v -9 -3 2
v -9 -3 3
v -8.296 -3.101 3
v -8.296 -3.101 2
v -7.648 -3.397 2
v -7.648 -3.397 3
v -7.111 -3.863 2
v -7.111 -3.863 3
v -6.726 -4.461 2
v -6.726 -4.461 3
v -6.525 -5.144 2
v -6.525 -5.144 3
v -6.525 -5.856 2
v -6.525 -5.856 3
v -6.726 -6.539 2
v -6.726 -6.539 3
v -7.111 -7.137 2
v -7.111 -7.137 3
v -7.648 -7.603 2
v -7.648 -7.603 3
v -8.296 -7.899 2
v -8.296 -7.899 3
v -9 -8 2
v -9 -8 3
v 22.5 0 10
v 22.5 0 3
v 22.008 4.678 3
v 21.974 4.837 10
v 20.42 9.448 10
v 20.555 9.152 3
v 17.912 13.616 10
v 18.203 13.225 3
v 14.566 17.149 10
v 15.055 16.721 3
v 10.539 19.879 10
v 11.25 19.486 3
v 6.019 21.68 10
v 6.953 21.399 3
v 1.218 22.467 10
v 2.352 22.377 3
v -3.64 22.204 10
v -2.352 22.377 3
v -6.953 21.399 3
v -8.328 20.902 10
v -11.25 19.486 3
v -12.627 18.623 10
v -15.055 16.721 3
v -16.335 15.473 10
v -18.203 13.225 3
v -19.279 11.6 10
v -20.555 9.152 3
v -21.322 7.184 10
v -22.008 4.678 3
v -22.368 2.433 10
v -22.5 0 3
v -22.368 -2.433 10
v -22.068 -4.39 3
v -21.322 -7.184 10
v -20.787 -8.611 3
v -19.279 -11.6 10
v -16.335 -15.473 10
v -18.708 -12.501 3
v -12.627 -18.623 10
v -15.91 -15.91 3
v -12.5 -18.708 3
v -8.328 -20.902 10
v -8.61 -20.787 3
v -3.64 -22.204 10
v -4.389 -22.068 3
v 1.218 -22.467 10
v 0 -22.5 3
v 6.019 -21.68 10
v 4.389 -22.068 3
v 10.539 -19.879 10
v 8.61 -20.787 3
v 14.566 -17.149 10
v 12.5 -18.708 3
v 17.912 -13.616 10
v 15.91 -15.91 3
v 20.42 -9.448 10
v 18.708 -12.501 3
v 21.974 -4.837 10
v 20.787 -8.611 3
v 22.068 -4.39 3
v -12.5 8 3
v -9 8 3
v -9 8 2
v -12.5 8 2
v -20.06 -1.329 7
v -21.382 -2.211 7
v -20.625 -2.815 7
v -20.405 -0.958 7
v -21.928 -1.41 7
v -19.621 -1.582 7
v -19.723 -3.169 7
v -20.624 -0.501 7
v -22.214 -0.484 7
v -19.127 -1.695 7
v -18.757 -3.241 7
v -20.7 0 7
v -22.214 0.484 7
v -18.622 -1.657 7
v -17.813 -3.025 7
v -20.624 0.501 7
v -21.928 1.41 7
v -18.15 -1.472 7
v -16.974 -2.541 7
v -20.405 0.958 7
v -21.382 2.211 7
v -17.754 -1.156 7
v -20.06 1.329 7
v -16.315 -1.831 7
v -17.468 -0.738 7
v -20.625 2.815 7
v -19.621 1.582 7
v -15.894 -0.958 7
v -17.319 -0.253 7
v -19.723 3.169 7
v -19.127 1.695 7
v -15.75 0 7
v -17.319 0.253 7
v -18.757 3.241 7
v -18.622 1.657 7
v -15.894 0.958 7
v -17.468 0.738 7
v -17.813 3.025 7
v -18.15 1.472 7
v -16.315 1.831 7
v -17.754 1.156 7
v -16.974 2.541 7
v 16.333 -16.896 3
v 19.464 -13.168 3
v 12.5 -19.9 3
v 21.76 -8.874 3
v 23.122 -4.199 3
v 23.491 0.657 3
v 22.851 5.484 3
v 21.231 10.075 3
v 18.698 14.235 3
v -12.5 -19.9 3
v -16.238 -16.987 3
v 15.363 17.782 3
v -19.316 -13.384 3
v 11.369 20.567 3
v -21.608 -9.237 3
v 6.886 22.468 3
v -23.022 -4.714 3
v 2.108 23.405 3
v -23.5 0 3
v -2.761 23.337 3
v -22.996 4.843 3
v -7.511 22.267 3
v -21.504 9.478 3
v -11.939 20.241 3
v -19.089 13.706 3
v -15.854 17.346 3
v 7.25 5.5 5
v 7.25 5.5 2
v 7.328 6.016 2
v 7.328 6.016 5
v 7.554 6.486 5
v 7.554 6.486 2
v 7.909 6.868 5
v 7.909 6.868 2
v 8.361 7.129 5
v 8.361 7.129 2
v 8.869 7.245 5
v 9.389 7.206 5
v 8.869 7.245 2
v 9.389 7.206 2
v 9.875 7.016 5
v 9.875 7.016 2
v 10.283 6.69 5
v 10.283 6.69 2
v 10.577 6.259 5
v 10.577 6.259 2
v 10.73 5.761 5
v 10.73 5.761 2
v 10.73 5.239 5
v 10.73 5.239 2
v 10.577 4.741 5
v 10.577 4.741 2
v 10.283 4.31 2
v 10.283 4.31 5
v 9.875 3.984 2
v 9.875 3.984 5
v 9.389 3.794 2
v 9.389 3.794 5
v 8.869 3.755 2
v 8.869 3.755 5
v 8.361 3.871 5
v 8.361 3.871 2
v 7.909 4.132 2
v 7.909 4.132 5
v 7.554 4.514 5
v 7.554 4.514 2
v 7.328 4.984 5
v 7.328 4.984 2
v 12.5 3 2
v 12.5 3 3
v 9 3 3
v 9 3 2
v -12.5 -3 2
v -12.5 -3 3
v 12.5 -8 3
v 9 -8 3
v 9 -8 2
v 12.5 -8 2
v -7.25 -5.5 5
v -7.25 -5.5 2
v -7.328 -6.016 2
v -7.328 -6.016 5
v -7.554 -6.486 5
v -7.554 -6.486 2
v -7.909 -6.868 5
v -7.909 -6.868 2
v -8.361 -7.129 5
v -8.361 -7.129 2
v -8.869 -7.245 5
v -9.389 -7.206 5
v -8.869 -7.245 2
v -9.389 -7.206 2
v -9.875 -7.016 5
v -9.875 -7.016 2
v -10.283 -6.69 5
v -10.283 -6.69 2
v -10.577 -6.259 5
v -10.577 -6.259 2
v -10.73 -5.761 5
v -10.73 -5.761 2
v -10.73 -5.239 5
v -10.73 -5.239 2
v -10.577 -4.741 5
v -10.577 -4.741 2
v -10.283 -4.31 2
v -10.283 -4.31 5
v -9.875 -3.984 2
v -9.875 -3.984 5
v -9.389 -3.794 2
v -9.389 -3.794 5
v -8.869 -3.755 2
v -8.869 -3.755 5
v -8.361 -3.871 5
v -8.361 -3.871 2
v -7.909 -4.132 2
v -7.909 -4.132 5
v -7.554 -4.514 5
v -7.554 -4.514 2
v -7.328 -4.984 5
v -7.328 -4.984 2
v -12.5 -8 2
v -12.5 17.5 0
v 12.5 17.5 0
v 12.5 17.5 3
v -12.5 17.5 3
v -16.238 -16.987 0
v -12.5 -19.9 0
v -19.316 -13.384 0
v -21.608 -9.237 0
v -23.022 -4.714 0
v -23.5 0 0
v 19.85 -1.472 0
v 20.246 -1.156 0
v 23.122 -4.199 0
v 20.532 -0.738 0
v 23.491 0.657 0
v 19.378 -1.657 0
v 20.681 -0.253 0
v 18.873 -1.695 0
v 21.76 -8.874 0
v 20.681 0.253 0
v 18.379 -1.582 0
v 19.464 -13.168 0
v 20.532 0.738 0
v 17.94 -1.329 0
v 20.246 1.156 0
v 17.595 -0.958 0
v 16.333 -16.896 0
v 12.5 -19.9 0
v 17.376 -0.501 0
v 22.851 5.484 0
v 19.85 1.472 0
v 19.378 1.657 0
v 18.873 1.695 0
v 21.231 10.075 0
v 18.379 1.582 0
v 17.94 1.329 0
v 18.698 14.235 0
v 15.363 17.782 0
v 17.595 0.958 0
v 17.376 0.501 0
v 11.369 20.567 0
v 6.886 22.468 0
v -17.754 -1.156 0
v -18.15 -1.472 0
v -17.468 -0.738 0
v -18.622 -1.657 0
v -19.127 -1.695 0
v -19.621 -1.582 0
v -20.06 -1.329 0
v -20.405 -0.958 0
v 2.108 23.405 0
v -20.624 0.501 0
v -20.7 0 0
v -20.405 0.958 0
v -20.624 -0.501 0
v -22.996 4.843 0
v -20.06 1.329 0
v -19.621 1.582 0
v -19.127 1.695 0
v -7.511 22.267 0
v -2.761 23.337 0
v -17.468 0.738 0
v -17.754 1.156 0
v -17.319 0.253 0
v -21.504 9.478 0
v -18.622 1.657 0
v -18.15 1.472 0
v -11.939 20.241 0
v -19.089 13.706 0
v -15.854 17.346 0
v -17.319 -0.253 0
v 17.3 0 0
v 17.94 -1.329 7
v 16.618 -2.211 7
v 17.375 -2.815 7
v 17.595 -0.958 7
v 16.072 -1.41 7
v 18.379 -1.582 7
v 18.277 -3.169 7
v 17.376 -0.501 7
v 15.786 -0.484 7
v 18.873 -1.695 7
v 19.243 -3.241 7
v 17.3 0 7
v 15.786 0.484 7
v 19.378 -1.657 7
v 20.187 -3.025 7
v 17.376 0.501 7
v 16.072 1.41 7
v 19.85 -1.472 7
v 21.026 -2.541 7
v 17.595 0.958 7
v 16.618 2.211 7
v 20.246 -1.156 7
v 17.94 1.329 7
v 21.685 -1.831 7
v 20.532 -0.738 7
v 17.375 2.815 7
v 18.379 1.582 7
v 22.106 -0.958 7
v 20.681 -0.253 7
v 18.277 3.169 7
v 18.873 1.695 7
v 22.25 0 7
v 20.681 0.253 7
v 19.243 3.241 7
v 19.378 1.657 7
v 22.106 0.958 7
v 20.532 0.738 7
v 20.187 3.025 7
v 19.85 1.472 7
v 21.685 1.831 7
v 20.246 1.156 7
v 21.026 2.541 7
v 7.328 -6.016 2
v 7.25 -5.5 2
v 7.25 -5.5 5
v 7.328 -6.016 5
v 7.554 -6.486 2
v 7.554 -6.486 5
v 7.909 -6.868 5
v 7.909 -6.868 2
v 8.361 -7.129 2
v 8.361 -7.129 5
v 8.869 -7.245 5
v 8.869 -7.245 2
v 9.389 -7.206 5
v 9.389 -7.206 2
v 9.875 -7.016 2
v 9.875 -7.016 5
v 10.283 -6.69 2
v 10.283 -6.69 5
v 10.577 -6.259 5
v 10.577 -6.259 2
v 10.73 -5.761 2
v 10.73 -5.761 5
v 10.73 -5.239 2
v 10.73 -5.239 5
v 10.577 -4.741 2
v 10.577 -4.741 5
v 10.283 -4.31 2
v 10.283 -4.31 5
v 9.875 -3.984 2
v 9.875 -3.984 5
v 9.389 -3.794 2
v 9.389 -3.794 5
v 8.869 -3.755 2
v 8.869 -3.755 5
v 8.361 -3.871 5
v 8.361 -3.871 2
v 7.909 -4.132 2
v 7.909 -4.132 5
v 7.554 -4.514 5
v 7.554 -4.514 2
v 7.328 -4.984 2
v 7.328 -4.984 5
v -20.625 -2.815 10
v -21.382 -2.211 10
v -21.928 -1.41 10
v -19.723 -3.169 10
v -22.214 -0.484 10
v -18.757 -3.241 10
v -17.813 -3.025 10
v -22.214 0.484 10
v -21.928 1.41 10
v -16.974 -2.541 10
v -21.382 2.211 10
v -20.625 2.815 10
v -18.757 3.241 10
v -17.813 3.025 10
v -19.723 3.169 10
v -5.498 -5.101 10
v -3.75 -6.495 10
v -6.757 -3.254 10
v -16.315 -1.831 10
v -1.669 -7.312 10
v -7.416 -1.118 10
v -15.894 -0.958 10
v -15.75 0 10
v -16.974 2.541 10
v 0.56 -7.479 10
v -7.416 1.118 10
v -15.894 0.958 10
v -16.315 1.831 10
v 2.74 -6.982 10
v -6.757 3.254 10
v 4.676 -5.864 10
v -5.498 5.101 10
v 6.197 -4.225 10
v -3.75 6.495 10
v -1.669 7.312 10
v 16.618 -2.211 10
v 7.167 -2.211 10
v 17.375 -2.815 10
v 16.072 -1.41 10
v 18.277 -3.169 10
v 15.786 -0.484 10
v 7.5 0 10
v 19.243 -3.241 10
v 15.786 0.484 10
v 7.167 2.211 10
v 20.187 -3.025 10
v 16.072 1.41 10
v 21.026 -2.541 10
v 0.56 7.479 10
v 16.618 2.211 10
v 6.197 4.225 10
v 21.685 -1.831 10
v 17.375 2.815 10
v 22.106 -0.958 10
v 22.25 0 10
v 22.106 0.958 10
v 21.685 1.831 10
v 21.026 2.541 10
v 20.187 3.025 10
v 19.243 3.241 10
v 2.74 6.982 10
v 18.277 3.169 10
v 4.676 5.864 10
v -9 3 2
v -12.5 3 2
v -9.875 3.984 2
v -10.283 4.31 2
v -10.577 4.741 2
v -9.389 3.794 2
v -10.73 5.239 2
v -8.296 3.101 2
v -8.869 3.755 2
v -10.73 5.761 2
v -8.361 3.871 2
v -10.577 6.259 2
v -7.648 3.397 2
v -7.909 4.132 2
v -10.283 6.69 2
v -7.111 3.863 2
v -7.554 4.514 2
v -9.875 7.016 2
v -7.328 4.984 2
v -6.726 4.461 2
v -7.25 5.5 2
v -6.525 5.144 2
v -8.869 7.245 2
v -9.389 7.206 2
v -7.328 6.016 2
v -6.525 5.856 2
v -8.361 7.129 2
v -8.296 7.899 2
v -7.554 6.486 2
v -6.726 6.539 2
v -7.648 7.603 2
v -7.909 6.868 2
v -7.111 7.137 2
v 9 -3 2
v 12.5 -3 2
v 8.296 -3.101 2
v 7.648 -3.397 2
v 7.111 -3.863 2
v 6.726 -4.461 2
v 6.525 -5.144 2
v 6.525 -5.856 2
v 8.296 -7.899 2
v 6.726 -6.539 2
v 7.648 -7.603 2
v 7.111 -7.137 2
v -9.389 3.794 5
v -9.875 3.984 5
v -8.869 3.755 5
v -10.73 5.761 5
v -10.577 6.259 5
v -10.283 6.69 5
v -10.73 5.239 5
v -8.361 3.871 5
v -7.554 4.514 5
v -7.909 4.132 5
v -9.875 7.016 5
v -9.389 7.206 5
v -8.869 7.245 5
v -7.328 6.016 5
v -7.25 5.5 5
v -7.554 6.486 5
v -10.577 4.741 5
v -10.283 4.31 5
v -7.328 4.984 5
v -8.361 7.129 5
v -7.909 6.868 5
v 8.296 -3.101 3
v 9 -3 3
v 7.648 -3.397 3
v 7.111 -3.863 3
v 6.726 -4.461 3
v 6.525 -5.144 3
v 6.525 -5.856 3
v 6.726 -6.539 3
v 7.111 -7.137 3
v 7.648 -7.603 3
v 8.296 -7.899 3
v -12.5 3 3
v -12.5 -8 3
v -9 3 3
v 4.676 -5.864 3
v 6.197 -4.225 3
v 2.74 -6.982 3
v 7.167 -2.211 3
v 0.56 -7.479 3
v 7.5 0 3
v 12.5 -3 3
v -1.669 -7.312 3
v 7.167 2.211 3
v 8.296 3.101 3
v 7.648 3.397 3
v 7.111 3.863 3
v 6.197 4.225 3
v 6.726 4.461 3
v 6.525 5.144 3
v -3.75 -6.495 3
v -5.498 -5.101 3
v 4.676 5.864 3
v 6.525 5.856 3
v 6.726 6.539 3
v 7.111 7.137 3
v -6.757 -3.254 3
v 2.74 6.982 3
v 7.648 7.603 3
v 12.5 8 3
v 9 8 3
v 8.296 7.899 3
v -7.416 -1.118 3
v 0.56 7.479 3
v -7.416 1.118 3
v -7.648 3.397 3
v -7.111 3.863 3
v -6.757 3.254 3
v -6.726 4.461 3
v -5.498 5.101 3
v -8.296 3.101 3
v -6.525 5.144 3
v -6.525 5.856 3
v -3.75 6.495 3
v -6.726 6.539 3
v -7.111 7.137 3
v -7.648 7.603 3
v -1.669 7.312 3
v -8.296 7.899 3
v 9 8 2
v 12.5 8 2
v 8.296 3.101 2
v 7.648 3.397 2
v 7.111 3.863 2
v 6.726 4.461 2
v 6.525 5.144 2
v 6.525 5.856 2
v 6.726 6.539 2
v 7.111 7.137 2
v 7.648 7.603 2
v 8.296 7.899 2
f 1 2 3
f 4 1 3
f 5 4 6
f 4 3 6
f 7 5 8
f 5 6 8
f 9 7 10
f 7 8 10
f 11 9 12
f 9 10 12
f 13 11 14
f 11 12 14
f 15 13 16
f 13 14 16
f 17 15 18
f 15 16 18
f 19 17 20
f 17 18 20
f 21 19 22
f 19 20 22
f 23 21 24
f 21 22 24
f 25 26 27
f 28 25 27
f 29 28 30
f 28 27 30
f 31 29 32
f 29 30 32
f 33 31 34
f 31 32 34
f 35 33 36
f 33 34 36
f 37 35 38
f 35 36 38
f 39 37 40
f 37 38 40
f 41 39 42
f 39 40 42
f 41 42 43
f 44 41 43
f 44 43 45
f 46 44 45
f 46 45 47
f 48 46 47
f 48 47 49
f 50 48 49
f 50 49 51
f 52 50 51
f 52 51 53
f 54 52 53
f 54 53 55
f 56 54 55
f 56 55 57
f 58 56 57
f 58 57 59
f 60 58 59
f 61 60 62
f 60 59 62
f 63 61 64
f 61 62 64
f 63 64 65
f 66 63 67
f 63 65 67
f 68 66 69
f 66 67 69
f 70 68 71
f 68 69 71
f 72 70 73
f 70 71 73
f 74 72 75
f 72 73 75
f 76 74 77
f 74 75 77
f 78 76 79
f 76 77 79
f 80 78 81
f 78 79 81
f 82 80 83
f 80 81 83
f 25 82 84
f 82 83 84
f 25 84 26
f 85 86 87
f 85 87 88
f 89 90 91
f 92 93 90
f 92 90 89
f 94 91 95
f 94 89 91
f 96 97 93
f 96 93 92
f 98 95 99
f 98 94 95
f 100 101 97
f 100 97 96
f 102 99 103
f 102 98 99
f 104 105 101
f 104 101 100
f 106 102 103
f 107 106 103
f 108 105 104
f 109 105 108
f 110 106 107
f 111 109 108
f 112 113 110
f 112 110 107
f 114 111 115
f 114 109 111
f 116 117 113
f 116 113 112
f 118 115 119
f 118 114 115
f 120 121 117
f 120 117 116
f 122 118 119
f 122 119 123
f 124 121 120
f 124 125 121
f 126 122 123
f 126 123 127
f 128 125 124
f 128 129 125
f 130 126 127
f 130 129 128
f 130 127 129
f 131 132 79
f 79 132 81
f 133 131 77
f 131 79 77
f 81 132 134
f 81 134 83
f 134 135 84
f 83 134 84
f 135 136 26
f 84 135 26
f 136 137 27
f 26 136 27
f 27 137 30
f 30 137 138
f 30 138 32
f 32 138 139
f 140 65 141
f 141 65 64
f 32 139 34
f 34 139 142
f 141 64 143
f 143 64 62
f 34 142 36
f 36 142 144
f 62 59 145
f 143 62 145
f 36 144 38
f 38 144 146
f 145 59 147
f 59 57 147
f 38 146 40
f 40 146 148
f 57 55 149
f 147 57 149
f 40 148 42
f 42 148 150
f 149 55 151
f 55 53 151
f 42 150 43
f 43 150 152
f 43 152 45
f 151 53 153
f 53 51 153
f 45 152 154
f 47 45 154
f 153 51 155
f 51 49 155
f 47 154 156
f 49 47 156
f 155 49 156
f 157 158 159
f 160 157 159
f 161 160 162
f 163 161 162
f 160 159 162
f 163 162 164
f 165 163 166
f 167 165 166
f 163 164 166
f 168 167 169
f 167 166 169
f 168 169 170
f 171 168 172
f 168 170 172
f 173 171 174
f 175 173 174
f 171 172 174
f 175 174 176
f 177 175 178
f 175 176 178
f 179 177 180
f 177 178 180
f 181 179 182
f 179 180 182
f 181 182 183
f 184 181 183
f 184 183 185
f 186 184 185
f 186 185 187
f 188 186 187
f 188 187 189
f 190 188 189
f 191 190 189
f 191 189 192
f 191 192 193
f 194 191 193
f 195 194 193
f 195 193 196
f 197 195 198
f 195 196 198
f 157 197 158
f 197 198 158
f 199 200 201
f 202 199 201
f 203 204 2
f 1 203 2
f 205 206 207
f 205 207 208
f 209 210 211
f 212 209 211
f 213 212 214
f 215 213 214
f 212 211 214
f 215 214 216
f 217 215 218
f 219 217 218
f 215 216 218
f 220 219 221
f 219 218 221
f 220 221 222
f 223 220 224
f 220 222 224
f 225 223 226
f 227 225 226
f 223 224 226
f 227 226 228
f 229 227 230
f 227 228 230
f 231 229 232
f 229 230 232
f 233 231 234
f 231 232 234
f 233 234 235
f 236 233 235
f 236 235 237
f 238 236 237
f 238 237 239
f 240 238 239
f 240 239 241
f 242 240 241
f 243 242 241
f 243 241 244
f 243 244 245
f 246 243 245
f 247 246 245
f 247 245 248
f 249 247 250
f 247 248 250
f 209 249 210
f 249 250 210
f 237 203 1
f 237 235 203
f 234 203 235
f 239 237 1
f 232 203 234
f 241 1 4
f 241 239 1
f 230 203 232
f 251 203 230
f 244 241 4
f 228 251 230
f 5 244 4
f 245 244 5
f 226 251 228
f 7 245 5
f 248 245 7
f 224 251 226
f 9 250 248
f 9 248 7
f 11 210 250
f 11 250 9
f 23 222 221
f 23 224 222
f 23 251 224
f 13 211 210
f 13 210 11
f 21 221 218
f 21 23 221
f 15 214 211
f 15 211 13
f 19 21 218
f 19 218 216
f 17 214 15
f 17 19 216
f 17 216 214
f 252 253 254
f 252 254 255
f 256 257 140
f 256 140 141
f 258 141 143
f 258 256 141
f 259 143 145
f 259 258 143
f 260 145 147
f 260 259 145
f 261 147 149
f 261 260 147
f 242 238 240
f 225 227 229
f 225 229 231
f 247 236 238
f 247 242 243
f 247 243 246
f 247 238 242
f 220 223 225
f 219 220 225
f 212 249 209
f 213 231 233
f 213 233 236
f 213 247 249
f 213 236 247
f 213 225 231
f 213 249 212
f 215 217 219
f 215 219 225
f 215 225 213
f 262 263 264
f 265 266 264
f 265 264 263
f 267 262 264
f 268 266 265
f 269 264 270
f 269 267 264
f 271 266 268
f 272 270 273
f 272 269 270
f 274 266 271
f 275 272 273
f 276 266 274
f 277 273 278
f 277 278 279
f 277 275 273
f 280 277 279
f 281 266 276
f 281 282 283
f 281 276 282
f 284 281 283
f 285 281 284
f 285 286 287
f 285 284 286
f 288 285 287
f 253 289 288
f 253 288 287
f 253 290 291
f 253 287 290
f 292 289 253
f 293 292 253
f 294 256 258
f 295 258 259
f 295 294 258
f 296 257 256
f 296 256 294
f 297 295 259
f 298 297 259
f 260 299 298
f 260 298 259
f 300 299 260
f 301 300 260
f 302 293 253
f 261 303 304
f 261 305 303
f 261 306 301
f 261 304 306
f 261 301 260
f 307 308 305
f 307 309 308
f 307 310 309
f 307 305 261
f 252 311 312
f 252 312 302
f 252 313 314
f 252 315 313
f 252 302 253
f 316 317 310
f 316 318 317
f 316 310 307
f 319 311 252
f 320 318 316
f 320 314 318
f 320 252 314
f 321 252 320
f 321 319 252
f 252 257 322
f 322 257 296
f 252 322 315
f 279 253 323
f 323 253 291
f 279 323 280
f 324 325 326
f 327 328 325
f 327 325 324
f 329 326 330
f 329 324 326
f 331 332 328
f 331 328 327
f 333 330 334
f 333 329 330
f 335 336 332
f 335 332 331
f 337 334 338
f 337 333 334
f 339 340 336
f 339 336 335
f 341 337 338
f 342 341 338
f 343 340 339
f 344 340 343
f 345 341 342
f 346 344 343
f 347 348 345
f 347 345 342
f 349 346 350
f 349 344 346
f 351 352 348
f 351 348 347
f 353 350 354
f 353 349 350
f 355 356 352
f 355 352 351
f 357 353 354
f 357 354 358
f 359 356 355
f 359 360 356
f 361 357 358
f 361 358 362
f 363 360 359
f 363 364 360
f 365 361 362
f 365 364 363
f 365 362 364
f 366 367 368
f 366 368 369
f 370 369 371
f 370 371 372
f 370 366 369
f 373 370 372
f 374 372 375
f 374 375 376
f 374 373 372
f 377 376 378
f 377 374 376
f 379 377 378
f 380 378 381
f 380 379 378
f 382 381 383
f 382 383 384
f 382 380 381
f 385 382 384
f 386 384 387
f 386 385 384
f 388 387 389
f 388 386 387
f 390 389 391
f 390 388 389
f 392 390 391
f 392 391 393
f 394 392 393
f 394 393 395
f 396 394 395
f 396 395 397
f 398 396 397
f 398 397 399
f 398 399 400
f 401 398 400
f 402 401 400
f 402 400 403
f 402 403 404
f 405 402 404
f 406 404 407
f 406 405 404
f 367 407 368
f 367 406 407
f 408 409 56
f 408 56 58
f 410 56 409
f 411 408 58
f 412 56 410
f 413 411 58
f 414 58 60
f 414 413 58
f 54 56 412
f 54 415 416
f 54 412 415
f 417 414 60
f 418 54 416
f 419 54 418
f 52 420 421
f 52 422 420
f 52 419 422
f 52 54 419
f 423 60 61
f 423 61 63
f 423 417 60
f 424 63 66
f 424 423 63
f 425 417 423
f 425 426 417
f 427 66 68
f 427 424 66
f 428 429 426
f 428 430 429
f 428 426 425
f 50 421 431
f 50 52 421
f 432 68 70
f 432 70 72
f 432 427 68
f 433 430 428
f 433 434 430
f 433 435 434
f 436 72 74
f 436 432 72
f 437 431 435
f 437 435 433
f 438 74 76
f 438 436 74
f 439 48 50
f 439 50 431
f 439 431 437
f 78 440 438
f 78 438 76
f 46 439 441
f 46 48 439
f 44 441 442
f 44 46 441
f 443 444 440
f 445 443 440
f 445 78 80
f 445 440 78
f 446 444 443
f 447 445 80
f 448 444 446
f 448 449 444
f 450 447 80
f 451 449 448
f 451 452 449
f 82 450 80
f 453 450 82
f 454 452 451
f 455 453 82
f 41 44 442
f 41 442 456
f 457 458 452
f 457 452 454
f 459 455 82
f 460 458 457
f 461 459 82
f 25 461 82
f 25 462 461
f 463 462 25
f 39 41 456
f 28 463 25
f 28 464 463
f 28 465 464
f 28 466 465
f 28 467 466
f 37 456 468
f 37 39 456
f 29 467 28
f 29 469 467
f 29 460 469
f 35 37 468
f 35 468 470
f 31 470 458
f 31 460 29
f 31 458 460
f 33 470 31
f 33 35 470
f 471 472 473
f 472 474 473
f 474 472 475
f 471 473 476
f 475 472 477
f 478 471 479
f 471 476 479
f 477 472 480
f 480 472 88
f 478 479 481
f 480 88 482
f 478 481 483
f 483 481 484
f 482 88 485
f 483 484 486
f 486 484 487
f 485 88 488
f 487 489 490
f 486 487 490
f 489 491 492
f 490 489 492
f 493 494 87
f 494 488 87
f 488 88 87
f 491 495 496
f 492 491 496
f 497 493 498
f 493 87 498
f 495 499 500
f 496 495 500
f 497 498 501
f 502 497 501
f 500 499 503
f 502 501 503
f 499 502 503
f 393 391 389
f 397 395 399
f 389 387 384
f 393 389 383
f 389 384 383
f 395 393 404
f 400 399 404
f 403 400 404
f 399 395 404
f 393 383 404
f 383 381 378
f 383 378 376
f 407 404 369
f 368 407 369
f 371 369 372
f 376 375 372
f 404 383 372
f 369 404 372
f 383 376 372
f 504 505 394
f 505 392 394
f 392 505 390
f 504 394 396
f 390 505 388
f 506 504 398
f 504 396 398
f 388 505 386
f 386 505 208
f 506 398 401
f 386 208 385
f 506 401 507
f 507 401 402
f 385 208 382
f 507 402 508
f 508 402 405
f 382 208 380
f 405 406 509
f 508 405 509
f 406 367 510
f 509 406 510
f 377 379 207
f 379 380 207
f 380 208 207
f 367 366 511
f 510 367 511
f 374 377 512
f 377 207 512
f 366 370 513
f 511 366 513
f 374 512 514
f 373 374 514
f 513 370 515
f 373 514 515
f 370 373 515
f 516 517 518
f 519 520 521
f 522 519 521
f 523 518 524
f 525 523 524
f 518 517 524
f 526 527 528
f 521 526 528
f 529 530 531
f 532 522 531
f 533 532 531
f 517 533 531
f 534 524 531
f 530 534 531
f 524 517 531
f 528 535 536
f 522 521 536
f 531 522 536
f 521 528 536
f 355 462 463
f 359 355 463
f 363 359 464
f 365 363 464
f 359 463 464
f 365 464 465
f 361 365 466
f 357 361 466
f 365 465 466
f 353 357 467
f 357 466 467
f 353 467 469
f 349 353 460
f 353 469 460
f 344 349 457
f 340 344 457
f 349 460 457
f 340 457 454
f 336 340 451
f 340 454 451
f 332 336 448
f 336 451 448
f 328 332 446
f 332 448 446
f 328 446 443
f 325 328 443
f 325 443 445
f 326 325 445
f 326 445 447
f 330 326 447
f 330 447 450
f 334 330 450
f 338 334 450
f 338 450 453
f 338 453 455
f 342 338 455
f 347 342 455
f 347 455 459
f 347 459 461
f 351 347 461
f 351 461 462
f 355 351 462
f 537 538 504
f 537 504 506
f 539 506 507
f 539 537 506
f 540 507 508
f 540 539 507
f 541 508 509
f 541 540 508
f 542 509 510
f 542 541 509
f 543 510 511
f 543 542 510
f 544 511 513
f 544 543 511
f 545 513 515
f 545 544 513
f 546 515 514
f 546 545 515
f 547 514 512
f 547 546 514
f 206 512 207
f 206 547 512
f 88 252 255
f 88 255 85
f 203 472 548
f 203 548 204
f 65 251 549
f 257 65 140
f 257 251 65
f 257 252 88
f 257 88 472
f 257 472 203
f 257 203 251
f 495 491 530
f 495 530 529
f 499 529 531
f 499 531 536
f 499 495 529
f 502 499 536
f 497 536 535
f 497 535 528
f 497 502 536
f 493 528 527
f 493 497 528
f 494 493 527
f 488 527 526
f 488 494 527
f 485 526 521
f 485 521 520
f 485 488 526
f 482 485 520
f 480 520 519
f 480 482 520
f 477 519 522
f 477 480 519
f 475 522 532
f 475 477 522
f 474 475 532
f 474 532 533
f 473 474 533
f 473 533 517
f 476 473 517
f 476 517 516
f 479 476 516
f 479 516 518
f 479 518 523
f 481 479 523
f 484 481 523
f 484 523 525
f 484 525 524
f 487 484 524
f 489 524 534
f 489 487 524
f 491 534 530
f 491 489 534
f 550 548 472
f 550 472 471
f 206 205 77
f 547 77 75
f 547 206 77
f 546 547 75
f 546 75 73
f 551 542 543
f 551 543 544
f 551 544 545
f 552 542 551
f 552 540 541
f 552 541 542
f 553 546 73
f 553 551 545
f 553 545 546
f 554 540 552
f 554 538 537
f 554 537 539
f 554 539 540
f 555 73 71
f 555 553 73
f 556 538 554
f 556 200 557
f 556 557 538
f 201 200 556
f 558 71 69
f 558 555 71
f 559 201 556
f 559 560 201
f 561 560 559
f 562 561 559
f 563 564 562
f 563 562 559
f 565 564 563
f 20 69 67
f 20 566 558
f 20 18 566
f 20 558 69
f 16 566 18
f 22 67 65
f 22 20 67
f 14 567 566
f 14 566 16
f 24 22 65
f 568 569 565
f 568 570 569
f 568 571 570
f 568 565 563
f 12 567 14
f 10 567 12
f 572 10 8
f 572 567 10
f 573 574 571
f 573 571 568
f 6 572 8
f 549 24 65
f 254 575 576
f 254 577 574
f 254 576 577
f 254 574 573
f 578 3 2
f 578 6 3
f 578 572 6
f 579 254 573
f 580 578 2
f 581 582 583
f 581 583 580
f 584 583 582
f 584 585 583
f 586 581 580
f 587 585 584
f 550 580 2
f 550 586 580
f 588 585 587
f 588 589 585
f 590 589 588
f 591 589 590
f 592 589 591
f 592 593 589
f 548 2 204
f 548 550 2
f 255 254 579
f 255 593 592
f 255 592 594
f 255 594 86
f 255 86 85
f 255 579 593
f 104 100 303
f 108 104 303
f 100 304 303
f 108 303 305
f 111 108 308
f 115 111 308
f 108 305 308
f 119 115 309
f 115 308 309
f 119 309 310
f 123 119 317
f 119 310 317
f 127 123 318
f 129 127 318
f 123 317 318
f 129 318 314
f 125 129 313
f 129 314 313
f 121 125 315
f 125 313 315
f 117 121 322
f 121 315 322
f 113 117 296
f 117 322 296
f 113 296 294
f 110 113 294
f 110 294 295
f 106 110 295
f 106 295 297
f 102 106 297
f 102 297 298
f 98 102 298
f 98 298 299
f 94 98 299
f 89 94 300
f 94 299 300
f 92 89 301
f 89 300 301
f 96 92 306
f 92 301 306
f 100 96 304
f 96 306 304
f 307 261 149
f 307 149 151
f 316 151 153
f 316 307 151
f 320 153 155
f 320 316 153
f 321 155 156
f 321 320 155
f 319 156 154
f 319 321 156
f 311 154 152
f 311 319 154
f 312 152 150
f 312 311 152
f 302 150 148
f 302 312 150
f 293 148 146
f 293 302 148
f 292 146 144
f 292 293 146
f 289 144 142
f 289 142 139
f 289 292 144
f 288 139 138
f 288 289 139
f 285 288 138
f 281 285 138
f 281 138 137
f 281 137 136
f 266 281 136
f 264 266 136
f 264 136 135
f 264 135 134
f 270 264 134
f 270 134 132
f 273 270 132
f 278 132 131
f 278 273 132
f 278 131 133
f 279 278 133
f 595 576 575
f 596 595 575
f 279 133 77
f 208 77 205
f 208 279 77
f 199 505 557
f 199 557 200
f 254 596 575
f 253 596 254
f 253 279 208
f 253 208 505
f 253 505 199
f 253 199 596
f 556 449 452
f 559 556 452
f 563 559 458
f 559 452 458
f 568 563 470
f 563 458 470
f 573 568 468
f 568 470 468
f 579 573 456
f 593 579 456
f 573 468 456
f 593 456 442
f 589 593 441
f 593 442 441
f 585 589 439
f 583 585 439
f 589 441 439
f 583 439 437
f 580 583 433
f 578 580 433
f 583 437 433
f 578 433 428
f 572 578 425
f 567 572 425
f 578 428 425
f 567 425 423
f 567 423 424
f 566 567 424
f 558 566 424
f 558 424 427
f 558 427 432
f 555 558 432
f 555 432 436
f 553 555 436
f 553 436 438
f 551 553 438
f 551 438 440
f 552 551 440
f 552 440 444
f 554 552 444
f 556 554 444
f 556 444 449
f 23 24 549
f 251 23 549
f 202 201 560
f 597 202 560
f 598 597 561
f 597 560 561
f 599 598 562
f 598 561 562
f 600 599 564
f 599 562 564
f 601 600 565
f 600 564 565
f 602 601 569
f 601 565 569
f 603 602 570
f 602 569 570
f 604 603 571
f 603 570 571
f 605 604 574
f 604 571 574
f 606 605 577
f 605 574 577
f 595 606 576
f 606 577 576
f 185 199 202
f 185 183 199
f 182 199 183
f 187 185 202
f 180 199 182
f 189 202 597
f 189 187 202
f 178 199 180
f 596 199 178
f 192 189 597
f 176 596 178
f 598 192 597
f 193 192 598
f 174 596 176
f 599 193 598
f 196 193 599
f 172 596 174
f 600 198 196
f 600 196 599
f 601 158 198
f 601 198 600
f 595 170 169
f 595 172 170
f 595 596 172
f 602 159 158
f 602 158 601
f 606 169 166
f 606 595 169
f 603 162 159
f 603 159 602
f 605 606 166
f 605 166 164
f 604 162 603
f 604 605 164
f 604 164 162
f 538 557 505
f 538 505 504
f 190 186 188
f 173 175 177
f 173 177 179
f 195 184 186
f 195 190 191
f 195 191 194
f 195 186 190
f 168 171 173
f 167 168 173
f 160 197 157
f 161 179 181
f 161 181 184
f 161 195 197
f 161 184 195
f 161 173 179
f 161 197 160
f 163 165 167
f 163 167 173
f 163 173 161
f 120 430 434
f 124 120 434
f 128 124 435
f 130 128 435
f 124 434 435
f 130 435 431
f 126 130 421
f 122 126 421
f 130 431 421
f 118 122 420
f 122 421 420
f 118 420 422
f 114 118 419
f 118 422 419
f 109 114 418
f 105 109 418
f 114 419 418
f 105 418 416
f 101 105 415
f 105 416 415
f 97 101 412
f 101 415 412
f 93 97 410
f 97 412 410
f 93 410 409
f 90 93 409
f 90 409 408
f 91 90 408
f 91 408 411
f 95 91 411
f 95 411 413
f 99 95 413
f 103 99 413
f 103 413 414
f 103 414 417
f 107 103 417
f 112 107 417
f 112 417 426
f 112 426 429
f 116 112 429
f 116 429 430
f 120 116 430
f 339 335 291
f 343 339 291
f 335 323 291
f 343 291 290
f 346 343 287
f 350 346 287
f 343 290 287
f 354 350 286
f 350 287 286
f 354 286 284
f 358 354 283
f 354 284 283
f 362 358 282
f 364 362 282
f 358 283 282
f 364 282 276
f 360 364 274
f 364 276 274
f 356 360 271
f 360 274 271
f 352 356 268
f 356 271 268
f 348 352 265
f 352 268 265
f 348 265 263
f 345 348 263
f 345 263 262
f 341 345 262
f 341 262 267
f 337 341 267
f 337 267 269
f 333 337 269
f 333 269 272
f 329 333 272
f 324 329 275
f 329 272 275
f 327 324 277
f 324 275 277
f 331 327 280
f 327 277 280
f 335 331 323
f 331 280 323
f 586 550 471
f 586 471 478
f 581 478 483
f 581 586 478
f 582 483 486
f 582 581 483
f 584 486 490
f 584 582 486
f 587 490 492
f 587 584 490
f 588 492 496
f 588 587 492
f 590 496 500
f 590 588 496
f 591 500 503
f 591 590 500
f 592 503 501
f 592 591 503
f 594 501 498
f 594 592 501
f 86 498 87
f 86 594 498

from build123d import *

# Parameters (mm, degrees)
SKETCH_5_R                   = 22.5
EXTRUDE_2_DEPTH              = 10
HOLE_WIZARD_M3_1_D           = 3.4
HOLE_WIZARD_M3_1_CBORE_D     = 6.5
HOLE_WIZARD_M3_1_CBORE_DEPTH = 3
SKETCH_12_W                  = 25
SKETCH_12_H                  = 40
CUT_EXTRUDE_1_DEPTH          = 3
EXTRUDE_3_DEPTH              = 1
SKETCH_14_R                  = 1.75
CUT_EXTRUDE_2_DEPTH          = 3
MIRROR_2_COPY_1_DEPTH        = 1
MIRROR_2_COPY_2_SKETCH_R     = 1.75
MIRROR_2_COPY_2_DEPTH        = 3
SKETCH_16_R                  = 7.5
CUT_EXTRUDE_3_DEPTH          = 11
EXTRUDE_4_DEPTH              = 3


with BuildPart() as part:
    # ｽｹｯﾁ5 → ﾎﾞｽ - 押し出し2 (new body)
    with BuildSketch(Plane.XY):
        Circle(SKETCH_5_R)
    extrude(amount=EXTRUDE_2_DEPTH)

    # M3 穴付きねじ用座ぐり穴1 (through all)
    with Locations(Plane.XY.offset(10)):
        with Locations((19, 0), (-19, 0)):
            CounterBoreHole(HOLE_WIZARD_M3_1_D / 2, HOLE_WIZARD_M3_1_CBORE_D / 2, HOLE_WIZARD_M3_1_CBORE_DEPTH)

    # ｽｹｯﾁ12 → ｶｯﾄ - 押し出し1 (cut)
    with BuildSketch(Plane(origin=(0, 0, 0), x_dir=(-1, 0, 0), z_dir=(0, 0, -1))):
        with Locations((0, -2.5)):
            Rectangle(SKETCH_12_W, SKETCH_12_H)
    extrude(amount=-CUT_EXTRUDE_1_DEPTH, mode=Mode.SUBTRACT)

    # ｽｹｯﾁ13 → ﾎﾞｽ - 押し出し3 (add)
    with BuildSketch(Plane(origin=(0, 0, 3), x_dir=(-1, 0, 0), z_dir=(0, 0, -1))):
        with BuildLine():
            Line((-12.5, 3), (-9, 3))
            ThreePointArc((-9, 3), (-6.5, 5.5), (-9, 8))
            Line((-9, 8), (-12.5, 8))
            Line((-12.5, 8), (-12.5, 3))
        make_face()
    extrude_3 = extrude(amount=EXTRUDE_3_DEPTH)

    # ｽｹｯﾁ14 → ｶｯﾄ - 押し出し2 (cut)
    with BuildSketch(Plane(origin=(0, 0, 2), x_dir=(-1, 0, 0), z_dir=(0, 0, -1))):
        with Locations((-9, 5.5)):
            Circle(SKETCH_14_R)
    cut_extrude_2 = extrude(amount=-CUT_EXTRUDE_2_DEPTH, mode=Mode.SUBTRACT)

    # ﾐﾗｰ1: ﾎﾞｽ - 押し出し3, ｶｯﾄ - 押し出し2 across plane
    add(extrude_3.mirror(Plane(origin=(0, 0, 0), x_dir=(0, 0, 1), z_dir=(1, 0, 0))))
    add(cut_extrude_2.mirror(Plane(origin=(0, 0, 0), x_dir=(0, 0, 1), z_dir=(1, 0, 0))), mode=Mode.SUBTRACT)

    # ﾐﾗｰ2: ﾎﾞｽ - 押し出し3, ｶｯﾄ - 押し出し2 across plane
    add(extrude_3.mirror(Plane.ZX))
    add(cut_extrude_2.mirror(Plane.ZX), mode=Mode.SUBTRACT)

    # ﾐﾗｰ2 copy 1 sketch → ﾐﾗｰ2 copy 1 (add)
    with BuildSketch(Plane(origin=(0, 0, 3), x_dir=(1, 0, 0), z_dir=(0, 0, -1))):
        with BuildLine():
            Line((-12.5, 3), (-9, 3))
            ThreePointArc((-9, 3), (-6.5, 5.5), (-9, 8))
            Line((-9, 8), (-12.5, 8))
            Line((-12.5, 8), (-12.5, 3))
        make_face()
    extrude(amount=MIRROR_2_COPY_1_DEPTH)

    # ﾐﾗｰ2 copy 2 sketch → ﾐﾗｰ2 copy 2 (cut)
    with BuildSketch(Plane(origin=(0, 0, 2), x_dir=(1, 0, 0), z_dir=(0, 0, -1))):
        with Locations((-9, 5.5)):
            Circle(MIRROR_2_COPY_2_SKETCH_R)
    extrude(amount=-MIRROR_2_COPY_2_DEPTH, mode=Mode.SUBTRACT)

    # ｽｹｯﾁ16 → ｶｯﾄ - 押し出し3 (cut, through all)
    with BuildSketch(Plane.XY.offset(10)):
        Circle(SKETCH_16_R)
    extrude(amount=-CUT_EXTRUDE_3_DEPTH, mode=Mode.SUBTRACT)

    # ｽｹｯﾁ17 → ﾎﾞｽ - 押し出し4 (add)
    with BuildSketch(Plane(origin=(0, 0, 0), x_dir=(-1, 0, 0), z_dir=(0, 0, -1))):
        with BuildLine():
            ThreePointArc((22.5, 0), (19.843134833, -10.606601718), (12.5, -18.708286934))
            Line((12.5, -18.708286934), (12.5, -19.899748742))
            ThreePointArc((12.5, -19.899748742), (20.566963801, -11.368817001), (23.5, 0))
            ThreePointArc((23.5, 0), (-11.368817001, 20.566963801), (-12.5, -19.899748742))
            Line((-12.5, -19.899748742), (-12.5, -18.708286934))
            ThreePointArc((-12.5, -18.708286934), (-10.606601718, 19.843134833), (22.5, 0))
        make_face()
    extrude(amount=-EXTRUDE_4_DEPTH)


solid = part.part
